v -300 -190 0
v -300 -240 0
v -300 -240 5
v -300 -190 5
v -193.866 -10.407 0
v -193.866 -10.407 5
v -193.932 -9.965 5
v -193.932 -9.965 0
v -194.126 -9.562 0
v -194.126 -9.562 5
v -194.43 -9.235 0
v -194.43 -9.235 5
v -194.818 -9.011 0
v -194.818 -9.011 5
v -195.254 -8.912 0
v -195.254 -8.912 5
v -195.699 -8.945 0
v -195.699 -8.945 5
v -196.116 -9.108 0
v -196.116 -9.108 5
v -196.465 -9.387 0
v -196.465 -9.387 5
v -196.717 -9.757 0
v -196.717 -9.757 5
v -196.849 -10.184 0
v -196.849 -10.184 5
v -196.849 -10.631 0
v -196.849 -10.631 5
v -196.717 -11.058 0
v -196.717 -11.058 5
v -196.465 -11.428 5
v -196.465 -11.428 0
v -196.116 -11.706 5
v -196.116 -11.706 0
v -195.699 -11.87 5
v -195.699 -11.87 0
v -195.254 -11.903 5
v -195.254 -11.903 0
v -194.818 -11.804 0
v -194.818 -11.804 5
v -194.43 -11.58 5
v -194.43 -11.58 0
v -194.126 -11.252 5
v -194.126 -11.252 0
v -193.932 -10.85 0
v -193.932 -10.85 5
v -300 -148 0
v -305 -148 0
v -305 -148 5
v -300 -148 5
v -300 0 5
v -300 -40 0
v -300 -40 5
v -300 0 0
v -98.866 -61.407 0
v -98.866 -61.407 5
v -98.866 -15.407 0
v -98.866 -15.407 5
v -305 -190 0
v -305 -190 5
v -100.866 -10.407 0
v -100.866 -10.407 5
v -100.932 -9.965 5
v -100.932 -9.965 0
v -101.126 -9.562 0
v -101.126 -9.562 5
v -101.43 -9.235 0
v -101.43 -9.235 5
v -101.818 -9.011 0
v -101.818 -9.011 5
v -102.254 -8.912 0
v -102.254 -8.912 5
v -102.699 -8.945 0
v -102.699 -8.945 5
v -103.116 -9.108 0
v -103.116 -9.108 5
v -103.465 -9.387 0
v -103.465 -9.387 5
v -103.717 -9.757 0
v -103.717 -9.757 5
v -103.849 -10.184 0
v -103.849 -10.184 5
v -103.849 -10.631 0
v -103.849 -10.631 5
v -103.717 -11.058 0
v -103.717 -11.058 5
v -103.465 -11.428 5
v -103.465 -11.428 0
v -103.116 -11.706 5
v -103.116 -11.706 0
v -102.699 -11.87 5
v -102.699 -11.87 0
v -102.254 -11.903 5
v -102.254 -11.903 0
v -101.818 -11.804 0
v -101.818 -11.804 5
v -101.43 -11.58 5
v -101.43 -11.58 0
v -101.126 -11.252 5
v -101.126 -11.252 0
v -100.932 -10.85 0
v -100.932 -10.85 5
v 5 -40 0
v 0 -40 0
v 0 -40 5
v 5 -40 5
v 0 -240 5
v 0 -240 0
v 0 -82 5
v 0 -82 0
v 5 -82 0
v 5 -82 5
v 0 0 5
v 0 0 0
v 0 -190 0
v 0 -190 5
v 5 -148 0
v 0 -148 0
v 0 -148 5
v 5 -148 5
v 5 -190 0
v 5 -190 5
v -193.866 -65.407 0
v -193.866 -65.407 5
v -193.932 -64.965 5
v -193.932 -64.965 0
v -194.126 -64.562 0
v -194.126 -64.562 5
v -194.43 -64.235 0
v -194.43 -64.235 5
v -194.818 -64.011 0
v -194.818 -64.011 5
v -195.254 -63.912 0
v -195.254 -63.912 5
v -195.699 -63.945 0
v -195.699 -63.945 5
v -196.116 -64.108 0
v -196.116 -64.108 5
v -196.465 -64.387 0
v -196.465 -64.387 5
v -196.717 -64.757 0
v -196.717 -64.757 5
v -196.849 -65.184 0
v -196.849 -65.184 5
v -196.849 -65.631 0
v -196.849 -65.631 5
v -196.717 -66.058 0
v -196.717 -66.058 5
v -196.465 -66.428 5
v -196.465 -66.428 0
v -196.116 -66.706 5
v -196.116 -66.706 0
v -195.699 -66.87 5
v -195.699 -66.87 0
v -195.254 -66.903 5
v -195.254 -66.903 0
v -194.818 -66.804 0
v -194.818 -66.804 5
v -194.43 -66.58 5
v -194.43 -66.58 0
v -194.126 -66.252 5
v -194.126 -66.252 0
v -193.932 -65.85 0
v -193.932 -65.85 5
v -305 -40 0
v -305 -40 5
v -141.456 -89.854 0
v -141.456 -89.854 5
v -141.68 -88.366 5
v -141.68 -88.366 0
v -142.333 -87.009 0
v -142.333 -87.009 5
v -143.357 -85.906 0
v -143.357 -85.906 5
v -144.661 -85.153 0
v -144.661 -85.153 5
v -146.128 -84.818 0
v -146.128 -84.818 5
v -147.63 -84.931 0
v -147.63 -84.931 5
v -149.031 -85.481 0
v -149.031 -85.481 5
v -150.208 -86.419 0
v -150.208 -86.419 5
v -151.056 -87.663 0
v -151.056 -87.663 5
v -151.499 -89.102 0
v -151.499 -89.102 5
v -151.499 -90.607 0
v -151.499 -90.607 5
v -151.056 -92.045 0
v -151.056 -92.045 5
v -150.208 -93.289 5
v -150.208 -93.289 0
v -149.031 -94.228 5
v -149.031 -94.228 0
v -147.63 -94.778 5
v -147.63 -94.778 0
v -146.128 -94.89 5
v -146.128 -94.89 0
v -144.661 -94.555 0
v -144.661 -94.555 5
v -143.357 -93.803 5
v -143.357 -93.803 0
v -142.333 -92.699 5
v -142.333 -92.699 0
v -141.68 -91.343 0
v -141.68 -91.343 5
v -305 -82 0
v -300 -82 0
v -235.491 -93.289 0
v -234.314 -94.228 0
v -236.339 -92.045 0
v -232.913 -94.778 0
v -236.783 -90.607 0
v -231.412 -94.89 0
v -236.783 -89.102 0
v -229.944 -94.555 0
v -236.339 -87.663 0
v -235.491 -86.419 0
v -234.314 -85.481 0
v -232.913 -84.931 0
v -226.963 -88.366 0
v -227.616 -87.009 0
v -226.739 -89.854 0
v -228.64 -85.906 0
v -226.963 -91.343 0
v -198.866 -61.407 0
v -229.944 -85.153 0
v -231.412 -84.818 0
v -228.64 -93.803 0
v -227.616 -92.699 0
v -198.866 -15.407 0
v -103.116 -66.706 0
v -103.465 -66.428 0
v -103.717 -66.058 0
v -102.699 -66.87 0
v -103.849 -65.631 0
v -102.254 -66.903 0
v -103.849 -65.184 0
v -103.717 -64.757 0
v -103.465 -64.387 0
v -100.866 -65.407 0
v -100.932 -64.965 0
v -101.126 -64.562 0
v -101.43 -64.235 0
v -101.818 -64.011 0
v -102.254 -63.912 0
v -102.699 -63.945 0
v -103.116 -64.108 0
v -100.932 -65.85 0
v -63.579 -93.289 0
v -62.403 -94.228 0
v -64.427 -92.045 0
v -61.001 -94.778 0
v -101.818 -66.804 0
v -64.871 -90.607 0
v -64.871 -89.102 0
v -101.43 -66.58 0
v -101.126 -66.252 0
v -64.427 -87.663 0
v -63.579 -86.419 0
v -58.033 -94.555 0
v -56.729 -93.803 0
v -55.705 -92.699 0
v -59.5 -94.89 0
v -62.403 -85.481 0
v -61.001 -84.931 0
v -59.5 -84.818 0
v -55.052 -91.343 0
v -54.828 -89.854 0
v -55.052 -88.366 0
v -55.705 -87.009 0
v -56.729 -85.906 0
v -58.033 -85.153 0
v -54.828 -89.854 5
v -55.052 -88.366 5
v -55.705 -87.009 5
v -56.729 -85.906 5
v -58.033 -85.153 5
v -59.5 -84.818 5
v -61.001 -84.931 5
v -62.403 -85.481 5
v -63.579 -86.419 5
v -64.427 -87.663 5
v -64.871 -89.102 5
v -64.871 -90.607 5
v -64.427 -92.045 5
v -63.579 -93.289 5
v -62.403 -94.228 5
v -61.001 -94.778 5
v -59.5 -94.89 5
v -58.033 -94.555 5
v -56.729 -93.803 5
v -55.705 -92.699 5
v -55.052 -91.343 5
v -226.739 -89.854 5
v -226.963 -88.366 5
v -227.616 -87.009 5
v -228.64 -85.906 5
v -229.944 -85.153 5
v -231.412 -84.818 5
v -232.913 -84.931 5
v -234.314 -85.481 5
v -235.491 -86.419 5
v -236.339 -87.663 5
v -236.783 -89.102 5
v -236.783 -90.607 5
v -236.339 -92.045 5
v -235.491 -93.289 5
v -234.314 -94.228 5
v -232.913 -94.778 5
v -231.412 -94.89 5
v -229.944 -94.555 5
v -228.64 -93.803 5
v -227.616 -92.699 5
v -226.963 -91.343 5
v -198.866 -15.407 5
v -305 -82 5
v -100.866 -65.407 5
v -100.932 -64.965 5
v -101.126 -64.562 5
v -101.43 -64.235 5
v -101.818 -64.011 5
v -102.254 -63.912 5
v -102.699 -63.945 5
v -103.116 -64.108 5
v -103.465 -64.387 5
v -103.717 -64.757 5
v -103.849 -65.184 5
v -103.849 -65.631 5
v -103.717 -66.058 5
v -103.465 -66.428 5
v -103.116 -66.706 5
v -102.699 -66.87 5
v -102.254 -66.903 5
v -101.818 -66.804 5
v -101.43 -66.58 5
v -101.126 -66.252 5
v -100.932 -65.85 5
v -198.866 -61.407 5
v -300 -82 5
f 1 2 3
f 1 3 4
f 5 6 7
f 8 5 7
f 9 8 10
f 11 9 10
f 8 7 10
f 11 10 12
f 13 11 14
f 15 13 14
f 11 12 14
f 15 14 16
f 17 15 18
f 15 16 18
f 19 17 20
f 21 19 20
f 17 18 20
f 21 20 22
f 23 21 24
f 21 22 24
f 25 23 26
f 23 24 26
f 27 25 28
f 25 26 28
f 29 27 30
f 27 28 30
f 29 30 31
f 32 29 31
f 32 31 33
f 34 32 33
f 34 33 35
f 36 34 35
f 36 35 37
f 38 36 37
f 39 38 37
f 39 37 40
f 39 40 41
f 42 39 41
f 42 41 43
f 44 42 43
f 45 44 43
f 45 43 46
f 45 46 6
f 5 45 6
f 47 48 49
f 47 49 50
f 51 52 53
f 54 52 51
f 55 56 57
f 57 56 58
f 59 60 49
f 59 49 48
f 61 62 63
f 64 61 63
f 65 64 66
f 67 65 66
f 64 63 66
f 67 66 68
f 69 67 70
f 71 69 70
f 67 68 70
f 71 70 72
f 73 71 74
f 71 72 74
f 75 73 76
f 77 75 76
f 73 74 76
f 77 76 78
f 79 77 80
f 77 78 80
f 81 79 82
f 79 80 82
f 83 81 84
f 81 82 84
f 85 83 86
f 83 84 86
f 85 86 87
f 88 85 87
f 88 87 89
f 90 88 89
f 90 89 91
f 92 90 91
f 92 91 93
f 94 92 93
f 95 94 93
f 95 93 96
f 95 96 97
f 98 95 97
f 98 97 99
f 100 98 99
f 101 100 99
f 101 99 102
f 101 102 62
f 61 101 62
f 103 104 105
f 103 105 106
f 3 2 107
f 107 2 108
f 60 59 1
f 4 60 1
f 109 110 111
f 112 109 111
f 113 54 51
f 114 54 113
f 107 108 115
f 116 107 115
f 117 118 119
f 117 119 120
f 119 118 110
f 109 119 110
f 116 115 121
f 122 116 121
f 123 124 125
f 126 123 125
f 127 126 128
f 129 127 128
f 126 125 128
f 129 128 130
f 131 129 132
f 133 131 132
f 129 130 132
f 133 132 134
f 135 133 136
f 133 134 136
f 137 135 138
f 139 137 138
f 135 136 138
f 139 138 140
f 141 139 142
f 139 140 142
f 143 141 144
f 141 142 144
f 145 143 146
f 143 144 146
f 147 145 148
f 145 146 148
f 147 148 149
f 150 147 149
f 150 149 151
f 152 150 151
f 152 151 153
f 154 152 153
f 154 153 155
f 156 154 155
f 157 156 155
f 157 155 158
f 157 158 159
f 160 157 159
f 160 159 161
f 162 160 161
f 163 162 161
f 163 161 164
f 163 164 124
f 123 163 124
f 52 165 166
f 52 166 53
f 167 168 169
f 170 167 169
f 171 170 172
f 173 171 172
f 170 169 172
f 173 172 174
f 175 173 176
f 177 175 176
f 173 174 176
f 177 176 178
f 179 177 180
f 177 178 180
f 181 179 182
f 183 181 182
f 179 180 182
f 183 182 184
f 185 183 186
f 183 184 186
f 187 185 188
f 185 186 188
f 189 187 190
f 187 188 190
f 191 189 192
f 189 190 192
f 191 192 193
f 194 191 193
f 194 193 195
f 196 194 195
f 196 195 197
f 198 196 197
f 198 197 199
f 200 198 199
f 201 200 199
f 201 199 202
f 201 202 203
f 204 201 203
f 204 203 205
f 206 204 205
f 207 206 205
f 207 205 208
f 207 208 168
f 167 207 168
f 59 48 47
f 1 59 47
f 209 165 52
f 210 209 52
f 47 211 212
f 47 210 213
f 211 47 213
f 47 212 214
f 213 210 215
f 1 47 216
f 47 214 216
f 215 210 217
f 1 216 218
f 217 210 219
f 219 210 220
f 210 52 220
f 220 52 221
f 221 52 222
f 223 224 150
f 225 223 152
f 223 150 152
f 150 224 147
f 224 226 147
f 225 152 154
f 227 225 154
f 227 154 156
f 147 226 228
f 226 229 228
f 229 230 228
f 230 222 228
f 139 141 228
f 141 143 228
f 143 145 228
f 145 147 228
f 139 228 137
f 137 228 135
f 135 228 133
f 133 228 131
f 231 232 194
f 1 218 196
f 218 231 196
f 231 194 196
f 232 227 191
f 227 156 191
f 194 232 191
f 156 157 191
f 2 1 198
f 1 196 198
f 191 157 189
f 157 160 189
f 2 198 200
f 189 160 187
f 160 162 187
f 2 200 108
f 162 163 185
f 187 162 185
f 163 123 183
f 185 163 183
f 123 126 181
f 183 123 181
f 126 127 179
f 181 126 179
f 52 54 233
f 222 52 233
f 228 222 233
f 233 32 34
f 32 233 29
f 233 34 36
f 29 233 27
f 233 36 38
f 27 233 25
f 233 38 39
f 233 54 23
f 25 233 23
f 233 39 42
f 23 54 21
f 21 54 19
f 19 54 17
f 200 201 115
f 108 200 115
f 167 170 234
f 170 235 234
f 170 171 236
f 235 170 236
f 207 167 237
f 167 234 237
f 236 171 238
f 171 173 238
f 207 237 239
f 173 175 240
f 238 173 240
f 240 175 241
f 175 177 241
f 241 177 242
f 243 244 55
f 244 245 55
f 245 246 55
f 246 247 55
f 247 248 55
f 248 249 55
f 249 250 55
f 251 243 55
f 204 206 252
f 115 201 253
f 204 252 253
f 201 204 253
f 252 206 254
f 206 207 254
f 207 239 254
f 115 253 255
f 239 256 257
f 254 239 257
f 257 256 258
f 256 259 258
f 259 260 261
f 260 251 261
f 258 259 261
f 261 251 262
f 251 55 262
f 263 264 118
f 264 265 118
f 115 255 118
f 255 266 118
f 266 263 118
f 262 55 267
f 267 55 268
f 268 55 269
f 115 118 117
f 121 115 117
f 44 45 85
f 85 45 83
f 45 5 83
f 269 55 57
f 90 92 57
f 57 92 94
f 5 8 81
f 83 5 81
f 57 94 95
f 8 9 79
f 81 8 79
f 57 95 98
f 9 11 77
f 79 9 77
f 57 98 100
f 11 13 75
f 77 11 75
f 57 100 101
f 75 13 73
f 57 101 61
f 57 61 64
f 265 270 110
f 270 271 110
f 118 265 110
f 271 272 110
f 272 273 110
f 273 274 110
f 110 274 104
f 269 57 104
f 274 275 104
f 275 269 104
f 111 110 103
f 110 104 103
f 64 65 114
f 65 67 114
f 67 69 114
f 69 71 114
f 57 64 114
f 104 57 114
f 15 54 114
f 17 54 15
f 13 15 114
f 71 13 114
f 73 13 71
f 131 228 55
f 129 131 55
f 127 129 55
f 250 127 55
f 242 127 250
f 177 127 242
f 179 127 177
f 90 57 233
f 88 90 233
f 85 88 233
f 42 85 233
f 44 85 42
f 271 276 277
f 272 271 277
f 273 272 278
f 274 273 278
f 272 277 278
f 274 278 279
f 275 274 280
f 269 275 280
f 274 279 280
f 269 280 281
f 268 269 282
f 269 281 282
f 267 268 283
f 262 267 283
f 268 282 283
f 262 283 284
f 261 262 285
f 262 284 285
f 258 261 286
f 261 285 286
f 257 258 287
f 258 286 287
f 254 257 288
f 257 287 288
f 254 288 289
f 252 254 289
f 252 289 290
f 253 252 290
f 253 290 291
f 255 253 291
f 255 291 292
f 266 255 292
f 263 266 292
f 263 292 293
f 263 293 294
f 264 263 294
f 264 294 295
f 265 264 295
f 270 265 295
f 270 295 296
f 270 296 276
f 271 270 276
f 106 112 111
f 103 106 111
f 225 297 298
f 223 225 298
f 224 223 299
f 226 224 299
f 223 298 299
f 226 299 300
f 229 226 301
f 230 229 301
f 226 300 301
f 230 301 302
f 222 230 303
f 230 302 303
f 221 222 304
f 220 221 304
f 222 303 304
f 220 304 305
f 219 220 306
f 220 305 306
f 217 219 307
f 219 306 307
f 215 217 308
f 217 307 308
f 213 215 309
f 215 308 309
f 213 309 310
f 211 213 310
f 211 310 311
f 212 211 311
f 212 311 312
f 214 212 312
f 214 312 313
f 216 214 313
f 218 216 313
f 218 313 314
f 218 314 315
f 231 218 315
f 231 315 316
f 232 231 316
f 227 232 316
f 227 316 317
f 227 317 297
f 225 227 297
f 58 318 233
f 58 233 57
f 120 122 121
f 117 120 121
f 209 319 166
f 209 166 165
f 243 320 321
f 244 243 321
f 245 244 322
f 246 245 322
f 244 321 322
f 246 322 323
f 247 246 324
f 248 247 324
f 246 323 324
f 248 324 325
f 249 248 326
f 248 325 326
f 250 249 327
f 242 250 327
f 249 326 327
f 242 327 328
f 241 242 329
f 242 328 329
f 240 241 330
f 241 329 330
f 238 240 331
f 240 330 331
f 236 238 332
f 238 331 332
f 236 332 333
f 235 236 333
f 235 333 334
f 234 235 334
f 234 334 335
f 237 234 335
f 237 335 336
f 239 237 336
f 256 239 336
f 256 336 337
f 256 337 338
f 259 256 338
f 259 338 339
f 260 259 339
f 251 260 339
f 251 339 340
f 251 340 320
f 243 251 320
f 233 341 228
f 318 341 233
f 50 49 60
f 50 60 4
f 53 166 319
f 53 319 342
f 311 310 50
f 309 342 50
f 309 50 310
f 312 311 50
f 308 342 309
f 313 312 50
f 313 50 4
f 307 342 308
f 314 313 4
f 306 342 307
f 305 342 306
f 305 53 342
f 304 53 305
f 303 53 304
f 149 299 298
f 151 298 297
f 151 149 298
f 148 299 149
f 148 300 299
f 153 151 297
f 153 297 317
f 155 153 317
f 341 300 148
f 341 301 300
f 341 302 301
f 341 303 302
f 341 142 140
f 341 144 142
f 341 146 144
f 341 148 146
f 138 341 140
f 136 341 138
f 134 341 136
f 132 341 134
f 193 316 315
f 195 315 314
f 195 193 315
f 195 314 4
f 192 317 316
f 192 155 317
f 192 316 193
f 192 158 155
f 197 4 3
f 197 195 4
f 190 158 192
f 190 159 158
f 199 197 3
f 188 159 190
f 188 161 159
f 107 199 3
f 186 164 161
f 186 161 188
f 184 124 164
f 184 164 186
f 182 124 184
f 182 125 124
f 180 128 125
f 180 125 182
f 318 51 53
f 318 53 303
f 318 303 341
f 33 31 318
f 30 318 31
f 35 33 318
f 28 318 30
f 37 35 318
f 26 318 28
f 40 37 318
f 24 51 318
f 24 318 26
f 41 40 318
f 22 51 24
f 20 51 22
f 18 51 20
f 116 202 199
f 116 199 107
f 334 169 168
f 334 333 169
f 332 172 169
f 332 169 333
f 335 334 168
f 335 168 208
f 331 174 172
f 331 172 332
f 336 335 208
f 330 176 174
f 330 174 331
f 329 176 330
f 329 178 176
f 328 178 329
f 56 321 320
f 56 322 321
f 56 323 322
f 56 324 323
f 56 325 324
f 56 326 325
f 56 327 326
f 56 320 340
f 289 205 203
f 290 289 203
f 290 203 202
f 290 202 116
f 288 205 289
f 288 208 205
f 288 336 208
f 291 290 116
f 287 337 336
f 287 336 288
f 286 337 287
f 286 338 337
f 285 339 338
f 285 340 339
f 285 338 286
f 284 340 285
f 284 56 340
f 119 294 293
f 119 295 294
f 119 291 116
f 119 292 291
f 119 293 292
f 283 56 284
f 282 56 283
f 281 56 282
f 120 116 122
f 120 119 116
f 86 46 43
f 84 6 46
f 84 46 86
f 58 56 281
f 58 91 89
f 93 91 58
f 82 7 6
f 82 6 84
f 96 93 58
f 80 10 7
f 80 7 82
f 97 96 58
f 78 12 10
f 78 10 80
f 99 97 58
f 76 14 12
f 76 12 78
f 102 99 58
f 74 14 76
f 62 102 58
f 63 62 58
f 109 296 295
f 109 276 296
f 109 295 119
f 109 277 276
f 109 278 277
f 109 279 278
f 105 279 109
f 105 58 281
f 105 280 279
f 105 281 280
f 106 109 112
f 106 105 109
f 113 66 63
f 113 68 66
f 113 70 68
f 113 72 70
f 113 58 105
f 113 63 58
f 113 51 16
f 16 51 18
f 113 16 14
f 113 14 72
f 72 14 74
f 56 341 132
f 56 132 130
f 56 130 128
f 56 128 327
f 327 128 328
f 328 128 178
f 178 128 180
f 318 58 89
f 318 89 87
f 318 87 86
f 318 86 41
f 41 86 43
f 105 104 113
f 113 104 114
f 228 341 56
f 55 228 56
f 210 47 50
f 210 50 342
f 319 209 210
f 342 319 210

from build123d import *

# Parameters (mm, degrees)
ESQUISSE1_W                          = 300
ESQUISSE1_H                          = 240
BOSS_EXTRU_1_DEPTH                   = 5
TENON_START                          = -190
TENON_ET_MORTAISE_TENON1_OUTLINE_W   = 5
TENON_ET_MORTAISE_TENON1_OUTLINE_H   = 5
TENON_ET_MORTAISE_TENON1_DEPTH       = 42
TENON_START_2                        = -82
TENON_ET_MORTAISE_TENON1_2_OUTLINE_W = 5
TENON_ET_MORTAISE_TENON1_2_OUTLINE_H = 5
TENON_ET_MORTAISE_TENON1_2_DEPTH     = 42
TENON_ET_MORTAISE_TENON2_OUTLINE_W   = 5
TENON_ET_MORTAISE_TENON2_OUTLINE_H   = 5
TENON_ET_MORTAISE_TENON2_DEPTH       = 42
TENON_ET_MORTAISE_TENON2_2_OUTLINE_W = 5
TENON_ET_MORTAISE_TENON2_2_OUTLINE_H = 5
TENON_ET_MORTAISE_TENON2_2_DEPTH     = 42
ESQUISSE2_R                          = 5.05
ENL_V_MAT_EXTRU_1_DEPTH              = 10
ESQUISSE3_W                          = 100
ESQUISSE3_H                          = 46
ENL_V_MAT_EXTRU_3_DEPTH              = 10
ESQUISSE5_R                          = 1.5
ENL_V_MAT_EXTRU_4_DEPTH              = 10


# Read off the part's stored shape, not the designer's step: Tenon et mortaise-Tenon1, Tenon et mortaise-Tenon2
with BuildPart() as part:
    # Esquisse1 → Boss.-Extru.1 (new body)
    with BuildSketch(Plane.XY):
        with Locations((-150, -120)):
            Rectangle(ESQUISSE1_W, ESQUISSE1_H)
    extrude(amount=BOSS_EXTRU_1_DEPTH)

    # Tenon et mortaise-Tenon1 outline → Tenon et mortaise-Tenon1 (add)
    with BuildSketch(Plane(origin=(0, 0, 0), x_dir=(1, 0, 0), z_dir=(0, 1, 0)).offset(TENON_START)):
        with Locations((-302.5, -2.5)):
            Rectangle(TENON_ET_MORTAISE_TENON1_OUTLINE_W, TENON_ET_MORTAISE_TENON1_OUTLINE_H)
    extrude(amount=TENON_ET_MORTAISE_TENON1_DEPTH)

    # Tenon et mortaise-Tenon1 2 outline → Tenon et mortaise-Tenon1 2 (add)
    with BuildSketch(Plane(origin=(0, 0, 0), x_dir=(1, 0, 0), z_dir=(0, 1, 0)).offset(TENON_START_2)):
        with Locations((-302.5, -2.5)):
            Rectangle(TENON_ET_MORTAISE_TENON1_2_OUTLINE_W, TENON_ET_MORTAISE_TENON1_2_OUTLINE_H)
    extrude(amount=TENON_ET_MORTAISE_TENON1_2_DEPTH)

    # Tenon et mortaise-Tenon2 outline → Tenon et mortaise-Tenon2 (add)
    with BuildSketch(Plane(origin=(0, 0, 0), x_dir=(1, 0, 0), z_dir=(0, 1, 0)).offset(TENON_START)):
        with Locations((2.5, -2.5)):
            Rectangle(TENON_ET_MORTAISE_TENON2_OUTLINE_W, TENON_ET_MORTAISE_TENON2_OUTLINE_H)
    extrude(amount=TENON_ET_MORTAISE_TENON2_DEPTH)

    # Tenon et mortaise-Tenon2 2 outline → Tenon et mortaise-Tenon2 2 (add)
    with BuildSketch(Plane(origin=(0, 0, 0), x_dir=(1, 0, 0), z_dir=(0, 1, 0)).offset(TENON_START_2)):
        with Locations((2.5, -2.5)):
            Rectangle(TENON_ET_MORTAISE_TENON2_2_OUTLINE_W, TENON_ET_MORTAISE_TENON2_2_OUTLINE_H)
    extrude(amount=TENON_ET_MORTAISE_TENON2_2_DEPTH)

    # Esquisse2 → Enlèv. mat.-Extru.1 (cut)
    with BuildSketch(Plane.XY.offset(5)):
        with Locations((-231.788943558, -89.854265633)):
            Circle(ESQUISSE2_R)
        with Locations((-146.505843122, -89.854265633)):
            Circle(ESQUISSE2_R)
        with Locations((-59.877583373, -89.854265633)):
            Circle(ESQUISSE2_R)
    extrude(amount=-ENL_V_MAT_EXTRU_1_DEPTH, mode=Mode.SUBTRACT)

    # Esquisse3 → Enlèv. mat.-Extru.3 (cut)
    with BuildSketch(Plane.XY.offset(5)):
        with Locations((-148.865660617, -38.407404502)):
            Rectangle(ESQUISSE3_W, ESQUISSE3_H)
    extrude(amount=-ENL_V_MAT_EXTRU_3_DEPTH, mode=Mode.SUBTRACT)

    # Esquisse5 → Enlèv. mat.-Extru.4 (cut)
    with BuildSketch(Plane.XY.offset(5)):
        with Locations((-102.365660617, -10.407404502)):
            Circle(ESQUISSE5_R)
        with Locations((-195.365660617, -10.407404502)):
            Circle(ESQUISSE5_R)
        with Locations((-195.365660617, -65.407404502)):
            Circle(ESQUISSE5_R)
        with Locations((-102.365660617, -65.407404502)):
            Circle(ESQUISSE5_R)
    extrude(amount=-ENL_V_MAT_EXTRU_4_DEPTH, mode=Mode.SUBTRACT)


solid = part.part
